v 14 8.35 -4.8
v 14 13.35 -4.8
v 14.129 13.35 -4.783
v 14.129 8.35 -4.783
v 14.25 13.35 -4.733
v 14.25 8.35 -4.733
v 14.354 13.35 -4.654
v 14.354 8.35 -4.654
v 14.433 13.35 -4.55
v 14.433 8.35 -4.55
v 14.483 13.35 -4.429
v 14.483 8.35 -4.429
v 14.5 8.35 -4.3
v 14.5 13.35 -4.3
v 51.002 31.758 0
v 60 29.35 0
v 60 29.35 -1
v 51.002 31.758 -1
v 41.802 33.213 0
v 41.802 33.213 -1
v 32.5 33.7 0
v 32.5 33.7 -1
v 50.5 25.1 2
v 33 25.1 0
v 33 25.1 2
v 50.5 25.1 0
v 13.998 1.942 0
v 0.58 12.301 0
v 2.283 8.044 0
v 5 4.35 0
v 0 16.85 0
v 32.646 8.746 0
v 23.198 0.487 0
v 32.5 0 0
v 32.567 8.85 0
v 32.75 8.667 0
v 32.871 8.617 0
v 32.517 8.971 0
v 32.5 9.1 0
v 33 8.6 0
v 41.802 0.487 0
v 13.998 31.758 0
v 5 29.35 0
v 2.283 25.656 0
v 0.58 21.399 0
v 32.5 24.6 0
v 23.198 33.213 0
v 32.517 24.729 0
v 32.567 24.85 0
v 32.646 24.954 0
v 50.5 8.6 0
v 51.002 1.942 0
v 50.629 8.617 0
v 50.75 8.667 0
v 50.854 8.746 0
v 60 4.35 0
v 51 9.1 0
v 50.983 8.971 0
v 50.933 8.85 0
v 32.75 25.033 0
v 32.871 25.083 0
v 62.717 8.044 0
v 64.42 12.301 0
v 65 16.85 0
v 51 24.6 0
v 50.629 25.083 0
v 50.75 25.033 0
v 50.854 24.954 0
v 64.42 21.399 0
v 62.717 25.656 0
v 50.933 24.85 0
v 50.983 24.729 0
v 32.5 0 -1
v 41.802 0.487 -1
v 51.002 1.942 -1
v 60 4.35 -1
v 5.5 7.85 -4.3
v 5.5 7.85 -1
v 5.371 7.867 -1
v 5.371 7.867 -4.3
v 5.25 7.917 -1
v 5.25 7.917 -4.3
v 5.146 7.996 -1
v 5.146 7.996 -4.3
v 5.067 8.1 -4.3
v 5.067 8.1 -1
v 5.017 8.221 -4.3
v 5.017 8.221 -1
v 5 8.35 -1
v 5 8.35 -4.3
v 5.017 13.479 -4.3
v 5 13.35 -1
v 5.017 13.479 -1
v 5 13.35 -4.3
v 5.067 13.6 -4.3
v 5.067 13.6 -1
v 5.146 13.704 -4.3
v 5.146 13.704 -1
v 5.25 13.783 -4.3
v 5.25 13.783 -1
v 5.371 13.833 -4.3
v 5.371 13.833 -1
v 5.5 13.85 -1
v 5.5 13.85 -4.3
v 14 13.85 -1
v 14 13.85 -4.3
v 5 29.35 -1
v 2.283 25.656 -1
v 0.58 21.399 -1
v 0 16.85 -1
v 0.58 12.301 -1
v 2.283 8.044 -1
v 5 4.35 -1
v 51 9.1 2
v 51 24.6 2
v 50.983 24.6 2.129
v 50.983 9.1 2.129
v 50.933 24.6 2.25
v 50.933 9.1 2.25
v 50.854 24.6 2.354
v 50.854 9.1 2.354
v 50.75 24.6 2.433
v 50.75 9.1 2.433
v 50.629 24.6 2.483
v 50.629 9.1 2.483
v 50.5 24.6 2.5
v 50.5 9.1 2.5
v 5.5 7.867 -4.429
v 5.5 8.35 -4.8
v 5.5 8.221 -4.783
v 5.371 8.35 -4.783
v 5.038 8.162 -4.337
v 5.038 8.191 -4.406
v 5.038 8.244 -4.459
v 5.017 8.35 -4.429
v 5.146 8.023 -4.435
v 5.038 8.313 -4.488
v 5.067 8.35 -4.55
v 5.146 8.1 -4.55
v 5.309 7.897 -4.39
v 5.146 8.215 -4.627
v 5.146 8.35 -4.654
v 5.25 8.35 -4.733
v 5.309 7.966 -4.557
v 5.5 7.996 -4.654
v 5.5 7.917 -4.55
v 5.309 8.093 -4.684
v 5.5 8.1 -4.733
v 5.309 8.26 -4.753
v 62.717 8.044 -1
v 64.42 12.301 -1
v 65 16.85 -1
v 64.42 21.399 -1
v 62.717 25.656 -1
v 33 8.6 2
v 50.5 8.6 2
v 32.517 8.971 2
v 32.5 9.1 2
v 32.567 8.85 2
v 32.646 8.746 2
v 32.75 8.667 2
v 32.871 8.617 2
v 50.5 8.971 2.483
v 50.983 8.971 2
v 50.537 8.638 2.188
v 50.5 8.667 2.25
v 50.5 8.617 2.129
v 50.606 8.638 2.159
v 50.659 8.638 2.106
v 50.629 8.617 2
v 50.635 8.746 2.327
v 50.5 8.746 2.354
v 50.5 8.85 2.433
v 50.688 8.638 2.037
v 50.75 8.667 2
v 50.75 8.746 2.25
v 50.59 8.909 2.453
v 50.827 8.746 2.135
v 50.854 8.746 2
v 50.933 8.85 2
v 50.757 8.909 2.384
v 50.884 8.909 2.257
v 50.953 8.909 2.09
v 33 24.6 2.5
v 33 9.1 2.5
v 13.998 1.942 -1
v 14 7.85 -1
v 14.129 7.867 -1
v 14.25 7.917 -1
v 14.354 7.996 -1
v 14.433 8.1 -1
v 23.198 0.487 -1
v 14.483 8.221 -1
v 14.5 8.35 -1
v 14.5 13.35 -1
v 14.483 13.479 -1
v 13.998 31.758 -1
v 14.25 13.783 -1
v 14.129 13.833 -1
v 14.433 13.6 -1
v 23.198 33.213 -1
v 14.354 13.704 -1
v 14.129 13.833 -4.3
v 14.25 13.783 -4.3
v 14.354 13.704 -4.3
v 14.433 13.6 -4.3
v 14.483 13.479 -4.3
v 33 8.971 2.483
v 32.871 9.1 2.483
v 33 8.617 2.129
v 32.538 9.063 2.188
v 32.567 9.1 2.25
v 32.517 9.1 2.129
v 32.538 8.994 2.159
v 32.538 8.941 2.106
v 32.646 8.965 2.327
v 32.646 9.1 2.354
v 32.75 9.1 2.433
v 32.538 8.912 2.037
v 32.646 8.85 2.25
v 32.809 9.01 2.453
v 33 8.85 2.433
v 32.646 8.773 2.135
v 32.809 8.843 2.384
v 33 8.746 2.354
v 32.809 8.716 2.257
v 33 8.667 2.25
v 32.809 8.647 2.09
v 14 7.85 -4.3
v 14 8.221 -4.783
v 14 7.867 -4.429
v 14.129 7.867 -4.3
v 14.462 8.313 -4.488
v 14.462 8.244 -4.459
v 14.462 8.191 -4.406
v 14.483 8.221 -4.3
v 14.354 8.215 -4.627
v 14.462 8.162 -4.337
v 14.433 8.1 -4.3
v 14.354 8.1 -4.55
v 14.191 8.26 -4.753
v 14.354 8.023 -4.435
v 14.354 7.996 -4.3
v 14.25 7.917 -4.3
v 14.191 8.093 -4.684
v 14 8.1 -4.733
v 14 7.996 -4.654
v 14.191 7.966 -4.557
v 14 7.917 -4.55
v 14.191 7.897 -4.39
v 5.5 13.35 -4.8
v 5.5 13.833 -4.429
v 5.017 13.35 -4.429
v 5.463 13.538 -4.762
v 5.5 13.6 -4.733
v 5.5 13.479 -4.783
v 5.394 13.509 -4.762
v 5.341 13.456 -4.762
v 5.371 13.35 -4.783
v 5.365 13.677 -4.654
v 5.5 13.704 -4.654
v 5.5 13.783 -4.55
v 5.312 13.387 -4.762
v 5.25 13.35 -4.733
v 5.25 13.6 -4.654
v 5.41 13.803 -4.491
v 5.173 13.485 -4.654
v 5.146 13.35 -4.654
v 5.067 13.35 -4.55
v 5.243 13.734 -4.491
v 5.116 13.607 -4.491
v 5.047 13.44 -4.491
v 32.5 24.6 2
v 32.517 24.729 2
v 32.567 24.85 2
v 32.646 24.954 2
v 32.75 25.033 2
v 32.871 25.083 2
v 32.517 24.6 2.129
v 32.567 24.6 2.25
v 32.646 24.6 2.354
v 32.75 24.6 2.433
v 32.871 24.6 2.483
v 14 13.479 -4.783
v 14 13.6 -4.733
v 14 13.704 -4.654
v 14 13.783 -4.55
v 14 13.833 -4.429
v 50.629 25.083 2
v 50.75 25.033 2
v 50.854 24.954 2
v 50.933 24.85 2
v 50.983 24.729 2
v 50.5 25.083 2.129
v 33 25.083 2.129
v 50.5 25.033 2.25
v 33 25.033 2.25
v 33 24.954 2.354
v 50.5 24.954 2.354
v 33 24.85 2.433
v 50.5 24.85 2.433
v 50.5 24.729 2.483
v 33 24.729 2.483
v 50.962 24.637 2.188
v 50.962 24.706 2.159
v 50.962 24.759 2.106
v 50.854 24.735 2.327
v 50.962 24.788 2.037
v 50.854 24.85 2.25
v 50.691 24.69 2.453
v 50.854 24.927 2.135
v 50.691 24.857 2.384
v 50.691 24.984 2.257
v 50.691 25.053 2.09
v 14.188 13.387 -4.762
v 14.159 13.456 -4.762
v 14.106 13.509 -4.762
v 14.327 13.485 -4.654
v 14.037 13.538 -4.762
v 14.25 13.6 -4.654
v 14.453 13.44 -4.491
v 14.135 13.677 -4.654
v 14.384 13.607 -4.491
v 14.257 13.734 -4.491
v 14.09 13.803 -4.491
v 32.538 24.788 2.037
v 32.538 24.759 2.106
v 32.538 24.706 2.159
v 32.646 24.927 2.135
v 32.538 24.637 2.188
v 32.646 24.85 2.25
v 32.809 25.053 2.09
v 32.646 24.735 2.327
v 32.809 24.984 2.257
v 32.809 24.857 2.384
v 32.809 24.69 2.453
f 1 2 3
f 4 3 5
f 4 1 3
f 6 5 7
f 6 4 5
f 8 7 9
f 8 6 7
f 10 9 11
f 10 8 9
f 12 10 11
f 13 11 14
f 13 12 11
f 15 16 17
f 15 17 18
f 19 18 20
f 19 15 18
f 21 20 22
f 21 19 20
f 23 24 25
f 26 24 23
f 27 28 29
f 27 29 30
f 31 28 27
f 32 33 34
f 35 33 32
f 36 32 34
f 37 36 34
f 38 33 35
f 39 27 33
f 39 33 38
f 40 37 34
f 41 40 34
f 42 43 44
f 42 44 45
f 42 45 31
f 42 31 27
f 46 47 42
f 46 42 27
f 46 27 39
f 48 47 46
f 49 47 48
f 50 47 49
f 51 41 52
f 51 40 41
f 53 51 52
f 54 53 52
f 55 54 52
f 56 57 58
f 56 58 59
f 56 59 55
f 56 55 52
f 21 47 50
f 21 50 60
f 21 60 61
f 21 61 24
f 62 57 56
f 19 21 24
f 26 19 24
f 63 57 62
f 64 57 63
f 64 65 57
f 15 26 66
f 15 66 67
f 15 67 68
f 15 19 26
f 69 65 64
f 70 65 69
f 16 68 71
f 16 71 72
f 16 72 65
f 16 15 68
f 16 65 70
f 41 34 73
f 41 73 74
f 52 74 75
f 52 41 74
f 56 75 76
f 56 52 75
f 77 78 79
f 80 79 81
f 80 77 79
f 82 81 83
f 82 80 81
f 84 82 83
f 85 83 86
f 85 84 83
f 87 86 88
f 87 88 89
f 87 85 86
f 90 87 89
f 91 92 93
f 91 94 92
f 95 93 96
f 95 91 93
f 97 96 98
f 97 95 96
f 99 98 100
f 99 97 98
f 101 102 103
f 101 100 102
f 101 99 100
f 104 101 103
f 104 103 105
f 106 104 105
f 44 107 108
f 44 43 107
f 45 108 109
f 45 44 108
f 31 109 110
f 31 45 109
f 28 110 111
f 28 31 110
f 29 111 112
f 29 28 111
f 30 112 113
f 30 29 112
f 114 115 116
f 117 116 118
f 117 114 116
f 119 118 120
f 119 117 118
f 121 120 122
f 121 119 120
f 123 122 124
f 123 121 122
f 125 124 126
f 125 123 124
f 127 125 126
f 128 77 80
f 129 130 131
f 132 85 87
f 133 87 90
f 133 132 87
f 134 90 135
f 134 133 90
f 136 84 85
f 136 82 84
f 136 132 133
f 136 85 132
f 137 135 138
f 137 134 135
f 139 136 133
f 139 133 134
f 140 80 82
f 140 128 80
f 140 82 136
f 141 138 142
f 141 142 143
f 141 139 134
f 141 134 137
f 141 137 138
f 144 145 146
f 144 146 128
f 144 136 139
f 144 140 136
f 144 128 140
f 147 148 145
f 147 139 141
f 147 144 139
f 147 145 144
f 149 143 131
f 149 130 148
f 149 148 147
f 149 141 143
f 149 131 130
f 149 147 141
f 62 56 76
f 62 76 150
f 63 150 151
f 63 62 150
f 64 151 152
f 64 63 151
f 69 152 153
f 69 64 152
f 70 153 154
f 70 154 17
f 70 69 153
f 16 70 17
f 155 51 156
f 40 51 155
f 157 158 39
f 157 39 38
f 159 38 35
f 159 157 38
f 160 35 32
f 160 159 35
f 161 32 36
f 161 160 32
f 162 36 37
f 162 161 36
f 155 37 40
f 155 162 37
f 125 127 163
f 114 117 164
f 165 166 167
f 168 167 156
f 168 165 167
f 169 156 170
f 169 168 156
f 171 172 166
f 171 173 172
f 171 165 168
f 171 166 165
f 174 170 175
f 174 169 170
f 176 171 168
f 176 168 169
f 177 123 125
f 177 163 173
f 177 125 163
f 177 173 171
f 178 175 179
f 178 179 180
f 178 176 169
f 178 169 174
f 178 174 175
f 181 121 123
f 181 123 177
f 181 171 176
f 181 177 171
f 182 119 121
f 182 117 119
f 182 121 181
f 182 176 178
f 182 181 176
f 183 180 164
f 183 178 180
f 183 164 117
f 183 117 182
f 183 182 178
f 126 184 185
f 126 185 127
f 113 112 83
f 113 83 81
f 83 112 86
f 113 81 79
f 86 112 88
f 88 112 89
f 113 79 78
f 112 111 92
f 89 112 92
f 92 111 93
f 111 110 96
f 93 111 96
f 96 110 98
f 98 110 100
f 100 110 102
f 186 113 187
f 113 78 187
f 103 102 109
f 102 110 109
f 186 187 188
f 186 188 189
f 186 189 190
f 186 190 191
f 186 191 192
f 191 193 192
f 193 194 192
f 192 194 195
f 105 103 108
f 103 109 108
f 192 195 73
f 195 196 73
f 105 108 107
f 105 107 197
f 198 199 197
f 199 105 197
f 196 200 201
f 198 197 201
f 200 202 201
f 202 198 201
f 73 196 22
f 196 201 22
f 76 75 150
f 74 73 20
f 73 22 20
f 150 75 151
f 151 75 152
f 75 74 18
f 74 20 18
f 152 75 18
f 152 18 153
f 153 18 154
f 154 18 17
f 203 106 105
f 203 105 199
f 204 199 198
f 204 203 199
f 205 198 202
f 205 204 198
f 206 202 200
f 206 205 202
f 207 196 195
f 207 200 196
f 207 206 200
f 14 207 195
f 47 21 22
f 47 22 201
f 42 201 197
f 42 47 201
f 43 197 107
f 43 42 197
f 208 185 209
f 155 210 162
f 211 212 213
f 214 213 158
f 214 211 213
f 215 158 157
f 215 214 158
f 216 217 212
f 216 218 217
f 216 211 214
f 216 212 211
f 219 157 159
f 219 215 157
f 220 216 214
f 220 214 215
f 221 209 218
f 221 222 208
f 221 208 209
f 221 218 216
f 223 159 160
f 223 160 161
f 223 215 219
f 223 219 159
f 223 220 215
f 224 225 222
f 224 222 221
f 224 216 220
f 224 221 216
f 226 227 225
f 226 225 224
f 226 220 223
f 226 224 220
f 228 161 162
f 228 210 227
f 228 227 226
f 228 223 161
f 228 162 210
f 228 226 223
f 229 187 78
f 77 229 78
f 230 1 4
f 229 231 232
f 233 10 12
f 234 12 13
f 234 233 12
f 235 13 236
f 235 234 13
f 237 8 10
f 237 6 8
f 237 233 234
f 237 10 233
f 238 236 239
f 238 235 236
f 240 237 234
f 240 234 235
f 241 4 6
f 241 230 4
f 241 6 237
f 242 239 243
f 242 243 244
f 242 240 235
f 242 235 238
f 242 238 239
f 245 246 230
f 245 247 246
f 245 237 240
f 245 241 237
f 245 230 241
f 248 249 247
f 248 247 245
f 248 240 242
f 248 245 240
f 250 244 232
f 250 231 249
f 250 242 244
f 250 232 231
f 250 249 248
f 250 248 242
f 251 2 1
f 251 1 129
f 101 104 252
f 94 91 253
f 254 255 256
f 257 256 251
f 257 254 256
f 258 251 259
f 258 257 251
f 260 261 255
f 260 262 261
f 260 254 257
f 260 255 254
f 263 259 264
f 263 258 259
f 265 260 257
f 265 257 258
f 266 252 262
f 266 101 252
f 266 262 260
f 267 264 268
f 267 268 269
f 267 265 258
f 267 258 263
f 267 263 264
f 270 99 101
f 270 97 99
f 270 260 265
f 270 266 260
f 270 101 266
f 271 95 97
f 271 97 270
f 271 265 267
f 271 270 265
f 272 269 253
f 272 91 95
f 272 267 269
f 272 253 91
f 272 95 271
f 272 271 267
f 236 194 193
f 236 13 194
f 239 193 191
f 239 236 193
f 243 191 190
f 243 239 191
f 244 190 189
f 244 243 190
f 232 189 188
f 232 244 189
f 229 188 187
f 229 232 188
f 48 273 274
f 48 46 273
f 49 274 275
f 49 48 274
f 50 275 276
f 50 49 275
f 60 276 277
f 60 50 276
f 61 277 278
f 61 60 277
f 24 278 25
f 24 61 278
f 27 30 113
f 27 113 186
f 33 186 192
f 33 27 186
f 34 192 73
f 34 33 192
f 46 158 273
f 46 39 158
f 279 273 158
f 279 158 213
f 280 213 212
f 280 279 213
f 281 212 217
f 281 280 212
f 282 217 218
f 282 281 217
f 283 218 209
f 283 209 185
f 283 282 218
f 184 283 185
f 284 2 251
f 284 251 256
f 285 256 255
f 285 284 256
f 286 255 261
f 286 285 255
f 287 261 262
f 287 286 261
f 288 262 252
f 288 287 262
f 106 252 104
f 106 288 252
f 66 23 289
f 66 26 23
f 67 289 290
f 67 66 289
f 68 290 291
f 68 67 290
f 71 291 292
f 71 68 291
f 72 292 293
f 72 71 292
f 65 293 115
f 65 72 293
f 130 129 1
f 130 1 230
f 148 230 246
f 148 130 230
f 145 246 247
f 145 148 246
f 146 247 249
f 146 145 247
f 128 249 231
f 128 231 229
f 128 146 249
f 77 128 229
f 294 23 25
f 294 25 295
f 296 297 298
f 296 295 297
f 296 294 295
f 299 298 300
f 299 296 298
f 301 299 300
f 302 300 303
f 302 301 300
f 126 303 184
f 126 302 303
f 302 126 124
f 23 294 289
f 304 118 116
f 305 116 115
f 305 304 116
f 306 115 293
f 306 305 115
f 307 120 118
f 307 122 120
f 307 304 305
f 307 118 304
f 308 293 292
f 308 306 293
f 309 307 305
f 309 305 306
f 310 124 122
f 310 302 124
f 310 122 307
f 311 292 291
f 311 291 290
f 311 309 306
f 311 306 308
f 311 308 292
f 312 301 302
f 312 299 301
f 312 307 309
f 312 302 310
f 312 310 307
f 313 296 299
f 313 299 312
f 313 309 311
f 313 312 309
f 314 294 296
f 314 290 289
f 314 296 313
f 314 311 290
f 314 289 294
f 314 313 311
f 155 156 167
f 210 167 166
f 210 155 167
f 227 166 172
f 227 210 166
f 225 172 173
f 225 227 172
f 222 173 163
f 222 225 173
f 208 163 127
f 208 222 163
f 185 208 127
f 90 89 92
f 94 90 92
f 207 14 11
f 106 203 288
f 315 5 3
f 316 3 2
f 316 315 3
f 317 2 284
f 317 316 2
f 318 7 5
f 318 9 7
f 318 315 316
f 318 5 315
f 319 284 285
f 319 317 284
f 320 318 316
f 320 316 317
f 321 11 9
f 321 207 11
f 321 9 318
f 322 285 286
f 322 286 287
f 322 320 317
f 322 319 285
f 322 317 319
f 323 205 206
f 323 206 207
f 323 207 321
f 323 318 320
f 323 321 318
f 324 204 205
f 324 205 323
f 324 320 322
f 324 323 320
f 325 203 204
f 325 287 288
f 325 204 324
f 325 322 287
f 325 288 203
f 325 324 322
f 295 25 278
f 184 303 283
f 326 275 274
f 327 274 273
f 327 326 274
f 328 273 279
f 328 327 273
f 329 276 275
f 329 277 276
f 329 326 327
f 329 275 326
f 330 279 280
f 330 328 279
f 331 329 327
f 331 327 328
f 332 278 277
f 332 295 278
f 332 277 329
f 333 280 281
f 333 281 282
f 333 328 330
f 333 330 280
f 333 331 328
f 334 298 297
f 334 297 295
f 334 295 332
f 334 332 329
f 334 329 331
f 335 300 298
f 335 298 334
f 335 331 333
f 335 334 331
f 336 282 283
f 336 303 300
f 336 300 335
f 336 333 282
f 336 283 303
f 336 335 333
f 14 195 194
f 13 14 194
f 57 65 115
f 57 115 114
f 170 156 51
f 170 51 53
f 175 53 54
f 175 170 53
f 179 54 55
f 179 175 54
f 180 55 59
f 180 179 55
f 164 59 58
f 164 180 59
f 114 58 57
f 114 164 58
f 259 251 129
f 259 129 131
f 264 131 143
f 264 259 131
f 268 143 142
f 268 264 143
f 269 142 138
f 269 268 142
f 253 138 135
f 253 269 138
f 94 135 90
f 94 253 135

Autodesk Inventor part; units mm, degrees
ref_plane "YZ Plane" through (0, 0, 0) normal (1, 0, 0) x (0, 1, 0)
ref_plane "XZ Plane" through (0, 0, 0) normal (0, 1, 0) x (-1, 0, 0)
ref_plane "XY Plane" through (0, 0, 0) normal (0, 0, 1) x (1, 0, 0)
sketch "Boceto1" plane through (0, 0, 0) normal (0, 0, 1) x (1, 0, 0)
  arc A0 (60, 29.35) -> (32.5, 33.7) centre (32.5, -55.4003) ccw
  arc A1 (32.5, 33.7) -> (5, 29.35) centre (32.5, -55.4003) ccw
  arc A2 (32.5, 0) -> (60, 4.35) centre (32.5, 89.1003) ccw
  arc A3 (60, 4.35) -> (60, 29.35) centre (46.875, 16.85) ccw
  arc A4 (5, 4.35) -> (32.5, 0) centre (32.5, 89.1003) ccw
  arc A5 (5, 29.35) -> (5, 4.35) centre (18.125, 16.85) ccw
  line L0 (32.5, 16.85) -> (32.5, 8.6)
  line L1 (32.5, 8.6) -> (32.5, 25.1)
  line L2 (32.5, 25.1) -> (51, 25.1)
  line L3 (51, 25.1) -> (51, 8.6)
  line L4 (51, 8.6) -> (32.5, 8.6)
  line L5 (32.5, 8.6) -> (32.5, 25.1)
  point P0 (0, 0)
  dimension "d6" = 8.25
  dimension "d7" = 16.5
extrude "Extrusión1" add sketch "Boceto1" along normal blind 2.5 and the other way blind 1 contours L1 L2 L3 L4 L0
extrude "Extrusión2" add sketch "Boceto1" against normal blind 1
sketch "Boceto2" plane through (0, 0, -1) normal (0, 0, -1) x (-1, 0, 0)
  arc A0 (-5, 4.35) -> (-5, 29.35) centre (-18.125, 16.85) ccw projected
  line L0 (0, 16.85) -> (-5, 16.85)
  line L1 (-5, 16.85) -> (-5, 13.85)
  line L2 (-5, 13.85) -> (-14.5, 13.85)
  line L3 (-14.5, 13.85) -> (-14.5, 7.85)
  line L4 (-14.5, 7.85) -> (-5, 7.85)
  line L5 (-5, 7.85) -> (-5, 13.85)
  line L6 (-5, 13.85) -> (-14.5, 13.85)
  line L7 (-14.5, 13.85) -> (-14.5, 7.85)
  point P0 (0, 0)
  dimension "d14" = 5
  dimension "d15" = 3
  dimension "d16" = 9.5
  dimension "d18" = 6
extrude "Extrusión3" add sketch "Boceto2" along normal blind 3.8
fillet "Empalme1" radius 0.5 16 edges at (5, 13.85, -2.9) (14.5, 13.85, -2.9) (9.75, 13.85, -4.8) (9.75, 7.85, -4.8) (14.5, 10.85, -4.8) (5, 10.85, -4.8) (41.75, 25.1, 2.5) (51, 16.85, 2.5) (41.75, 8.6, 2.5) (32.5, 16.85, 2.5) (32.5, 25.1, 1.25) (51, 25.1, 1.25) (32.5, 8.6, 1.25) (51, 8.6, 1.25) (5, 7.85, -2.9) (14.5, 7.85, -2.9)
properties part number "Bluetooth"
